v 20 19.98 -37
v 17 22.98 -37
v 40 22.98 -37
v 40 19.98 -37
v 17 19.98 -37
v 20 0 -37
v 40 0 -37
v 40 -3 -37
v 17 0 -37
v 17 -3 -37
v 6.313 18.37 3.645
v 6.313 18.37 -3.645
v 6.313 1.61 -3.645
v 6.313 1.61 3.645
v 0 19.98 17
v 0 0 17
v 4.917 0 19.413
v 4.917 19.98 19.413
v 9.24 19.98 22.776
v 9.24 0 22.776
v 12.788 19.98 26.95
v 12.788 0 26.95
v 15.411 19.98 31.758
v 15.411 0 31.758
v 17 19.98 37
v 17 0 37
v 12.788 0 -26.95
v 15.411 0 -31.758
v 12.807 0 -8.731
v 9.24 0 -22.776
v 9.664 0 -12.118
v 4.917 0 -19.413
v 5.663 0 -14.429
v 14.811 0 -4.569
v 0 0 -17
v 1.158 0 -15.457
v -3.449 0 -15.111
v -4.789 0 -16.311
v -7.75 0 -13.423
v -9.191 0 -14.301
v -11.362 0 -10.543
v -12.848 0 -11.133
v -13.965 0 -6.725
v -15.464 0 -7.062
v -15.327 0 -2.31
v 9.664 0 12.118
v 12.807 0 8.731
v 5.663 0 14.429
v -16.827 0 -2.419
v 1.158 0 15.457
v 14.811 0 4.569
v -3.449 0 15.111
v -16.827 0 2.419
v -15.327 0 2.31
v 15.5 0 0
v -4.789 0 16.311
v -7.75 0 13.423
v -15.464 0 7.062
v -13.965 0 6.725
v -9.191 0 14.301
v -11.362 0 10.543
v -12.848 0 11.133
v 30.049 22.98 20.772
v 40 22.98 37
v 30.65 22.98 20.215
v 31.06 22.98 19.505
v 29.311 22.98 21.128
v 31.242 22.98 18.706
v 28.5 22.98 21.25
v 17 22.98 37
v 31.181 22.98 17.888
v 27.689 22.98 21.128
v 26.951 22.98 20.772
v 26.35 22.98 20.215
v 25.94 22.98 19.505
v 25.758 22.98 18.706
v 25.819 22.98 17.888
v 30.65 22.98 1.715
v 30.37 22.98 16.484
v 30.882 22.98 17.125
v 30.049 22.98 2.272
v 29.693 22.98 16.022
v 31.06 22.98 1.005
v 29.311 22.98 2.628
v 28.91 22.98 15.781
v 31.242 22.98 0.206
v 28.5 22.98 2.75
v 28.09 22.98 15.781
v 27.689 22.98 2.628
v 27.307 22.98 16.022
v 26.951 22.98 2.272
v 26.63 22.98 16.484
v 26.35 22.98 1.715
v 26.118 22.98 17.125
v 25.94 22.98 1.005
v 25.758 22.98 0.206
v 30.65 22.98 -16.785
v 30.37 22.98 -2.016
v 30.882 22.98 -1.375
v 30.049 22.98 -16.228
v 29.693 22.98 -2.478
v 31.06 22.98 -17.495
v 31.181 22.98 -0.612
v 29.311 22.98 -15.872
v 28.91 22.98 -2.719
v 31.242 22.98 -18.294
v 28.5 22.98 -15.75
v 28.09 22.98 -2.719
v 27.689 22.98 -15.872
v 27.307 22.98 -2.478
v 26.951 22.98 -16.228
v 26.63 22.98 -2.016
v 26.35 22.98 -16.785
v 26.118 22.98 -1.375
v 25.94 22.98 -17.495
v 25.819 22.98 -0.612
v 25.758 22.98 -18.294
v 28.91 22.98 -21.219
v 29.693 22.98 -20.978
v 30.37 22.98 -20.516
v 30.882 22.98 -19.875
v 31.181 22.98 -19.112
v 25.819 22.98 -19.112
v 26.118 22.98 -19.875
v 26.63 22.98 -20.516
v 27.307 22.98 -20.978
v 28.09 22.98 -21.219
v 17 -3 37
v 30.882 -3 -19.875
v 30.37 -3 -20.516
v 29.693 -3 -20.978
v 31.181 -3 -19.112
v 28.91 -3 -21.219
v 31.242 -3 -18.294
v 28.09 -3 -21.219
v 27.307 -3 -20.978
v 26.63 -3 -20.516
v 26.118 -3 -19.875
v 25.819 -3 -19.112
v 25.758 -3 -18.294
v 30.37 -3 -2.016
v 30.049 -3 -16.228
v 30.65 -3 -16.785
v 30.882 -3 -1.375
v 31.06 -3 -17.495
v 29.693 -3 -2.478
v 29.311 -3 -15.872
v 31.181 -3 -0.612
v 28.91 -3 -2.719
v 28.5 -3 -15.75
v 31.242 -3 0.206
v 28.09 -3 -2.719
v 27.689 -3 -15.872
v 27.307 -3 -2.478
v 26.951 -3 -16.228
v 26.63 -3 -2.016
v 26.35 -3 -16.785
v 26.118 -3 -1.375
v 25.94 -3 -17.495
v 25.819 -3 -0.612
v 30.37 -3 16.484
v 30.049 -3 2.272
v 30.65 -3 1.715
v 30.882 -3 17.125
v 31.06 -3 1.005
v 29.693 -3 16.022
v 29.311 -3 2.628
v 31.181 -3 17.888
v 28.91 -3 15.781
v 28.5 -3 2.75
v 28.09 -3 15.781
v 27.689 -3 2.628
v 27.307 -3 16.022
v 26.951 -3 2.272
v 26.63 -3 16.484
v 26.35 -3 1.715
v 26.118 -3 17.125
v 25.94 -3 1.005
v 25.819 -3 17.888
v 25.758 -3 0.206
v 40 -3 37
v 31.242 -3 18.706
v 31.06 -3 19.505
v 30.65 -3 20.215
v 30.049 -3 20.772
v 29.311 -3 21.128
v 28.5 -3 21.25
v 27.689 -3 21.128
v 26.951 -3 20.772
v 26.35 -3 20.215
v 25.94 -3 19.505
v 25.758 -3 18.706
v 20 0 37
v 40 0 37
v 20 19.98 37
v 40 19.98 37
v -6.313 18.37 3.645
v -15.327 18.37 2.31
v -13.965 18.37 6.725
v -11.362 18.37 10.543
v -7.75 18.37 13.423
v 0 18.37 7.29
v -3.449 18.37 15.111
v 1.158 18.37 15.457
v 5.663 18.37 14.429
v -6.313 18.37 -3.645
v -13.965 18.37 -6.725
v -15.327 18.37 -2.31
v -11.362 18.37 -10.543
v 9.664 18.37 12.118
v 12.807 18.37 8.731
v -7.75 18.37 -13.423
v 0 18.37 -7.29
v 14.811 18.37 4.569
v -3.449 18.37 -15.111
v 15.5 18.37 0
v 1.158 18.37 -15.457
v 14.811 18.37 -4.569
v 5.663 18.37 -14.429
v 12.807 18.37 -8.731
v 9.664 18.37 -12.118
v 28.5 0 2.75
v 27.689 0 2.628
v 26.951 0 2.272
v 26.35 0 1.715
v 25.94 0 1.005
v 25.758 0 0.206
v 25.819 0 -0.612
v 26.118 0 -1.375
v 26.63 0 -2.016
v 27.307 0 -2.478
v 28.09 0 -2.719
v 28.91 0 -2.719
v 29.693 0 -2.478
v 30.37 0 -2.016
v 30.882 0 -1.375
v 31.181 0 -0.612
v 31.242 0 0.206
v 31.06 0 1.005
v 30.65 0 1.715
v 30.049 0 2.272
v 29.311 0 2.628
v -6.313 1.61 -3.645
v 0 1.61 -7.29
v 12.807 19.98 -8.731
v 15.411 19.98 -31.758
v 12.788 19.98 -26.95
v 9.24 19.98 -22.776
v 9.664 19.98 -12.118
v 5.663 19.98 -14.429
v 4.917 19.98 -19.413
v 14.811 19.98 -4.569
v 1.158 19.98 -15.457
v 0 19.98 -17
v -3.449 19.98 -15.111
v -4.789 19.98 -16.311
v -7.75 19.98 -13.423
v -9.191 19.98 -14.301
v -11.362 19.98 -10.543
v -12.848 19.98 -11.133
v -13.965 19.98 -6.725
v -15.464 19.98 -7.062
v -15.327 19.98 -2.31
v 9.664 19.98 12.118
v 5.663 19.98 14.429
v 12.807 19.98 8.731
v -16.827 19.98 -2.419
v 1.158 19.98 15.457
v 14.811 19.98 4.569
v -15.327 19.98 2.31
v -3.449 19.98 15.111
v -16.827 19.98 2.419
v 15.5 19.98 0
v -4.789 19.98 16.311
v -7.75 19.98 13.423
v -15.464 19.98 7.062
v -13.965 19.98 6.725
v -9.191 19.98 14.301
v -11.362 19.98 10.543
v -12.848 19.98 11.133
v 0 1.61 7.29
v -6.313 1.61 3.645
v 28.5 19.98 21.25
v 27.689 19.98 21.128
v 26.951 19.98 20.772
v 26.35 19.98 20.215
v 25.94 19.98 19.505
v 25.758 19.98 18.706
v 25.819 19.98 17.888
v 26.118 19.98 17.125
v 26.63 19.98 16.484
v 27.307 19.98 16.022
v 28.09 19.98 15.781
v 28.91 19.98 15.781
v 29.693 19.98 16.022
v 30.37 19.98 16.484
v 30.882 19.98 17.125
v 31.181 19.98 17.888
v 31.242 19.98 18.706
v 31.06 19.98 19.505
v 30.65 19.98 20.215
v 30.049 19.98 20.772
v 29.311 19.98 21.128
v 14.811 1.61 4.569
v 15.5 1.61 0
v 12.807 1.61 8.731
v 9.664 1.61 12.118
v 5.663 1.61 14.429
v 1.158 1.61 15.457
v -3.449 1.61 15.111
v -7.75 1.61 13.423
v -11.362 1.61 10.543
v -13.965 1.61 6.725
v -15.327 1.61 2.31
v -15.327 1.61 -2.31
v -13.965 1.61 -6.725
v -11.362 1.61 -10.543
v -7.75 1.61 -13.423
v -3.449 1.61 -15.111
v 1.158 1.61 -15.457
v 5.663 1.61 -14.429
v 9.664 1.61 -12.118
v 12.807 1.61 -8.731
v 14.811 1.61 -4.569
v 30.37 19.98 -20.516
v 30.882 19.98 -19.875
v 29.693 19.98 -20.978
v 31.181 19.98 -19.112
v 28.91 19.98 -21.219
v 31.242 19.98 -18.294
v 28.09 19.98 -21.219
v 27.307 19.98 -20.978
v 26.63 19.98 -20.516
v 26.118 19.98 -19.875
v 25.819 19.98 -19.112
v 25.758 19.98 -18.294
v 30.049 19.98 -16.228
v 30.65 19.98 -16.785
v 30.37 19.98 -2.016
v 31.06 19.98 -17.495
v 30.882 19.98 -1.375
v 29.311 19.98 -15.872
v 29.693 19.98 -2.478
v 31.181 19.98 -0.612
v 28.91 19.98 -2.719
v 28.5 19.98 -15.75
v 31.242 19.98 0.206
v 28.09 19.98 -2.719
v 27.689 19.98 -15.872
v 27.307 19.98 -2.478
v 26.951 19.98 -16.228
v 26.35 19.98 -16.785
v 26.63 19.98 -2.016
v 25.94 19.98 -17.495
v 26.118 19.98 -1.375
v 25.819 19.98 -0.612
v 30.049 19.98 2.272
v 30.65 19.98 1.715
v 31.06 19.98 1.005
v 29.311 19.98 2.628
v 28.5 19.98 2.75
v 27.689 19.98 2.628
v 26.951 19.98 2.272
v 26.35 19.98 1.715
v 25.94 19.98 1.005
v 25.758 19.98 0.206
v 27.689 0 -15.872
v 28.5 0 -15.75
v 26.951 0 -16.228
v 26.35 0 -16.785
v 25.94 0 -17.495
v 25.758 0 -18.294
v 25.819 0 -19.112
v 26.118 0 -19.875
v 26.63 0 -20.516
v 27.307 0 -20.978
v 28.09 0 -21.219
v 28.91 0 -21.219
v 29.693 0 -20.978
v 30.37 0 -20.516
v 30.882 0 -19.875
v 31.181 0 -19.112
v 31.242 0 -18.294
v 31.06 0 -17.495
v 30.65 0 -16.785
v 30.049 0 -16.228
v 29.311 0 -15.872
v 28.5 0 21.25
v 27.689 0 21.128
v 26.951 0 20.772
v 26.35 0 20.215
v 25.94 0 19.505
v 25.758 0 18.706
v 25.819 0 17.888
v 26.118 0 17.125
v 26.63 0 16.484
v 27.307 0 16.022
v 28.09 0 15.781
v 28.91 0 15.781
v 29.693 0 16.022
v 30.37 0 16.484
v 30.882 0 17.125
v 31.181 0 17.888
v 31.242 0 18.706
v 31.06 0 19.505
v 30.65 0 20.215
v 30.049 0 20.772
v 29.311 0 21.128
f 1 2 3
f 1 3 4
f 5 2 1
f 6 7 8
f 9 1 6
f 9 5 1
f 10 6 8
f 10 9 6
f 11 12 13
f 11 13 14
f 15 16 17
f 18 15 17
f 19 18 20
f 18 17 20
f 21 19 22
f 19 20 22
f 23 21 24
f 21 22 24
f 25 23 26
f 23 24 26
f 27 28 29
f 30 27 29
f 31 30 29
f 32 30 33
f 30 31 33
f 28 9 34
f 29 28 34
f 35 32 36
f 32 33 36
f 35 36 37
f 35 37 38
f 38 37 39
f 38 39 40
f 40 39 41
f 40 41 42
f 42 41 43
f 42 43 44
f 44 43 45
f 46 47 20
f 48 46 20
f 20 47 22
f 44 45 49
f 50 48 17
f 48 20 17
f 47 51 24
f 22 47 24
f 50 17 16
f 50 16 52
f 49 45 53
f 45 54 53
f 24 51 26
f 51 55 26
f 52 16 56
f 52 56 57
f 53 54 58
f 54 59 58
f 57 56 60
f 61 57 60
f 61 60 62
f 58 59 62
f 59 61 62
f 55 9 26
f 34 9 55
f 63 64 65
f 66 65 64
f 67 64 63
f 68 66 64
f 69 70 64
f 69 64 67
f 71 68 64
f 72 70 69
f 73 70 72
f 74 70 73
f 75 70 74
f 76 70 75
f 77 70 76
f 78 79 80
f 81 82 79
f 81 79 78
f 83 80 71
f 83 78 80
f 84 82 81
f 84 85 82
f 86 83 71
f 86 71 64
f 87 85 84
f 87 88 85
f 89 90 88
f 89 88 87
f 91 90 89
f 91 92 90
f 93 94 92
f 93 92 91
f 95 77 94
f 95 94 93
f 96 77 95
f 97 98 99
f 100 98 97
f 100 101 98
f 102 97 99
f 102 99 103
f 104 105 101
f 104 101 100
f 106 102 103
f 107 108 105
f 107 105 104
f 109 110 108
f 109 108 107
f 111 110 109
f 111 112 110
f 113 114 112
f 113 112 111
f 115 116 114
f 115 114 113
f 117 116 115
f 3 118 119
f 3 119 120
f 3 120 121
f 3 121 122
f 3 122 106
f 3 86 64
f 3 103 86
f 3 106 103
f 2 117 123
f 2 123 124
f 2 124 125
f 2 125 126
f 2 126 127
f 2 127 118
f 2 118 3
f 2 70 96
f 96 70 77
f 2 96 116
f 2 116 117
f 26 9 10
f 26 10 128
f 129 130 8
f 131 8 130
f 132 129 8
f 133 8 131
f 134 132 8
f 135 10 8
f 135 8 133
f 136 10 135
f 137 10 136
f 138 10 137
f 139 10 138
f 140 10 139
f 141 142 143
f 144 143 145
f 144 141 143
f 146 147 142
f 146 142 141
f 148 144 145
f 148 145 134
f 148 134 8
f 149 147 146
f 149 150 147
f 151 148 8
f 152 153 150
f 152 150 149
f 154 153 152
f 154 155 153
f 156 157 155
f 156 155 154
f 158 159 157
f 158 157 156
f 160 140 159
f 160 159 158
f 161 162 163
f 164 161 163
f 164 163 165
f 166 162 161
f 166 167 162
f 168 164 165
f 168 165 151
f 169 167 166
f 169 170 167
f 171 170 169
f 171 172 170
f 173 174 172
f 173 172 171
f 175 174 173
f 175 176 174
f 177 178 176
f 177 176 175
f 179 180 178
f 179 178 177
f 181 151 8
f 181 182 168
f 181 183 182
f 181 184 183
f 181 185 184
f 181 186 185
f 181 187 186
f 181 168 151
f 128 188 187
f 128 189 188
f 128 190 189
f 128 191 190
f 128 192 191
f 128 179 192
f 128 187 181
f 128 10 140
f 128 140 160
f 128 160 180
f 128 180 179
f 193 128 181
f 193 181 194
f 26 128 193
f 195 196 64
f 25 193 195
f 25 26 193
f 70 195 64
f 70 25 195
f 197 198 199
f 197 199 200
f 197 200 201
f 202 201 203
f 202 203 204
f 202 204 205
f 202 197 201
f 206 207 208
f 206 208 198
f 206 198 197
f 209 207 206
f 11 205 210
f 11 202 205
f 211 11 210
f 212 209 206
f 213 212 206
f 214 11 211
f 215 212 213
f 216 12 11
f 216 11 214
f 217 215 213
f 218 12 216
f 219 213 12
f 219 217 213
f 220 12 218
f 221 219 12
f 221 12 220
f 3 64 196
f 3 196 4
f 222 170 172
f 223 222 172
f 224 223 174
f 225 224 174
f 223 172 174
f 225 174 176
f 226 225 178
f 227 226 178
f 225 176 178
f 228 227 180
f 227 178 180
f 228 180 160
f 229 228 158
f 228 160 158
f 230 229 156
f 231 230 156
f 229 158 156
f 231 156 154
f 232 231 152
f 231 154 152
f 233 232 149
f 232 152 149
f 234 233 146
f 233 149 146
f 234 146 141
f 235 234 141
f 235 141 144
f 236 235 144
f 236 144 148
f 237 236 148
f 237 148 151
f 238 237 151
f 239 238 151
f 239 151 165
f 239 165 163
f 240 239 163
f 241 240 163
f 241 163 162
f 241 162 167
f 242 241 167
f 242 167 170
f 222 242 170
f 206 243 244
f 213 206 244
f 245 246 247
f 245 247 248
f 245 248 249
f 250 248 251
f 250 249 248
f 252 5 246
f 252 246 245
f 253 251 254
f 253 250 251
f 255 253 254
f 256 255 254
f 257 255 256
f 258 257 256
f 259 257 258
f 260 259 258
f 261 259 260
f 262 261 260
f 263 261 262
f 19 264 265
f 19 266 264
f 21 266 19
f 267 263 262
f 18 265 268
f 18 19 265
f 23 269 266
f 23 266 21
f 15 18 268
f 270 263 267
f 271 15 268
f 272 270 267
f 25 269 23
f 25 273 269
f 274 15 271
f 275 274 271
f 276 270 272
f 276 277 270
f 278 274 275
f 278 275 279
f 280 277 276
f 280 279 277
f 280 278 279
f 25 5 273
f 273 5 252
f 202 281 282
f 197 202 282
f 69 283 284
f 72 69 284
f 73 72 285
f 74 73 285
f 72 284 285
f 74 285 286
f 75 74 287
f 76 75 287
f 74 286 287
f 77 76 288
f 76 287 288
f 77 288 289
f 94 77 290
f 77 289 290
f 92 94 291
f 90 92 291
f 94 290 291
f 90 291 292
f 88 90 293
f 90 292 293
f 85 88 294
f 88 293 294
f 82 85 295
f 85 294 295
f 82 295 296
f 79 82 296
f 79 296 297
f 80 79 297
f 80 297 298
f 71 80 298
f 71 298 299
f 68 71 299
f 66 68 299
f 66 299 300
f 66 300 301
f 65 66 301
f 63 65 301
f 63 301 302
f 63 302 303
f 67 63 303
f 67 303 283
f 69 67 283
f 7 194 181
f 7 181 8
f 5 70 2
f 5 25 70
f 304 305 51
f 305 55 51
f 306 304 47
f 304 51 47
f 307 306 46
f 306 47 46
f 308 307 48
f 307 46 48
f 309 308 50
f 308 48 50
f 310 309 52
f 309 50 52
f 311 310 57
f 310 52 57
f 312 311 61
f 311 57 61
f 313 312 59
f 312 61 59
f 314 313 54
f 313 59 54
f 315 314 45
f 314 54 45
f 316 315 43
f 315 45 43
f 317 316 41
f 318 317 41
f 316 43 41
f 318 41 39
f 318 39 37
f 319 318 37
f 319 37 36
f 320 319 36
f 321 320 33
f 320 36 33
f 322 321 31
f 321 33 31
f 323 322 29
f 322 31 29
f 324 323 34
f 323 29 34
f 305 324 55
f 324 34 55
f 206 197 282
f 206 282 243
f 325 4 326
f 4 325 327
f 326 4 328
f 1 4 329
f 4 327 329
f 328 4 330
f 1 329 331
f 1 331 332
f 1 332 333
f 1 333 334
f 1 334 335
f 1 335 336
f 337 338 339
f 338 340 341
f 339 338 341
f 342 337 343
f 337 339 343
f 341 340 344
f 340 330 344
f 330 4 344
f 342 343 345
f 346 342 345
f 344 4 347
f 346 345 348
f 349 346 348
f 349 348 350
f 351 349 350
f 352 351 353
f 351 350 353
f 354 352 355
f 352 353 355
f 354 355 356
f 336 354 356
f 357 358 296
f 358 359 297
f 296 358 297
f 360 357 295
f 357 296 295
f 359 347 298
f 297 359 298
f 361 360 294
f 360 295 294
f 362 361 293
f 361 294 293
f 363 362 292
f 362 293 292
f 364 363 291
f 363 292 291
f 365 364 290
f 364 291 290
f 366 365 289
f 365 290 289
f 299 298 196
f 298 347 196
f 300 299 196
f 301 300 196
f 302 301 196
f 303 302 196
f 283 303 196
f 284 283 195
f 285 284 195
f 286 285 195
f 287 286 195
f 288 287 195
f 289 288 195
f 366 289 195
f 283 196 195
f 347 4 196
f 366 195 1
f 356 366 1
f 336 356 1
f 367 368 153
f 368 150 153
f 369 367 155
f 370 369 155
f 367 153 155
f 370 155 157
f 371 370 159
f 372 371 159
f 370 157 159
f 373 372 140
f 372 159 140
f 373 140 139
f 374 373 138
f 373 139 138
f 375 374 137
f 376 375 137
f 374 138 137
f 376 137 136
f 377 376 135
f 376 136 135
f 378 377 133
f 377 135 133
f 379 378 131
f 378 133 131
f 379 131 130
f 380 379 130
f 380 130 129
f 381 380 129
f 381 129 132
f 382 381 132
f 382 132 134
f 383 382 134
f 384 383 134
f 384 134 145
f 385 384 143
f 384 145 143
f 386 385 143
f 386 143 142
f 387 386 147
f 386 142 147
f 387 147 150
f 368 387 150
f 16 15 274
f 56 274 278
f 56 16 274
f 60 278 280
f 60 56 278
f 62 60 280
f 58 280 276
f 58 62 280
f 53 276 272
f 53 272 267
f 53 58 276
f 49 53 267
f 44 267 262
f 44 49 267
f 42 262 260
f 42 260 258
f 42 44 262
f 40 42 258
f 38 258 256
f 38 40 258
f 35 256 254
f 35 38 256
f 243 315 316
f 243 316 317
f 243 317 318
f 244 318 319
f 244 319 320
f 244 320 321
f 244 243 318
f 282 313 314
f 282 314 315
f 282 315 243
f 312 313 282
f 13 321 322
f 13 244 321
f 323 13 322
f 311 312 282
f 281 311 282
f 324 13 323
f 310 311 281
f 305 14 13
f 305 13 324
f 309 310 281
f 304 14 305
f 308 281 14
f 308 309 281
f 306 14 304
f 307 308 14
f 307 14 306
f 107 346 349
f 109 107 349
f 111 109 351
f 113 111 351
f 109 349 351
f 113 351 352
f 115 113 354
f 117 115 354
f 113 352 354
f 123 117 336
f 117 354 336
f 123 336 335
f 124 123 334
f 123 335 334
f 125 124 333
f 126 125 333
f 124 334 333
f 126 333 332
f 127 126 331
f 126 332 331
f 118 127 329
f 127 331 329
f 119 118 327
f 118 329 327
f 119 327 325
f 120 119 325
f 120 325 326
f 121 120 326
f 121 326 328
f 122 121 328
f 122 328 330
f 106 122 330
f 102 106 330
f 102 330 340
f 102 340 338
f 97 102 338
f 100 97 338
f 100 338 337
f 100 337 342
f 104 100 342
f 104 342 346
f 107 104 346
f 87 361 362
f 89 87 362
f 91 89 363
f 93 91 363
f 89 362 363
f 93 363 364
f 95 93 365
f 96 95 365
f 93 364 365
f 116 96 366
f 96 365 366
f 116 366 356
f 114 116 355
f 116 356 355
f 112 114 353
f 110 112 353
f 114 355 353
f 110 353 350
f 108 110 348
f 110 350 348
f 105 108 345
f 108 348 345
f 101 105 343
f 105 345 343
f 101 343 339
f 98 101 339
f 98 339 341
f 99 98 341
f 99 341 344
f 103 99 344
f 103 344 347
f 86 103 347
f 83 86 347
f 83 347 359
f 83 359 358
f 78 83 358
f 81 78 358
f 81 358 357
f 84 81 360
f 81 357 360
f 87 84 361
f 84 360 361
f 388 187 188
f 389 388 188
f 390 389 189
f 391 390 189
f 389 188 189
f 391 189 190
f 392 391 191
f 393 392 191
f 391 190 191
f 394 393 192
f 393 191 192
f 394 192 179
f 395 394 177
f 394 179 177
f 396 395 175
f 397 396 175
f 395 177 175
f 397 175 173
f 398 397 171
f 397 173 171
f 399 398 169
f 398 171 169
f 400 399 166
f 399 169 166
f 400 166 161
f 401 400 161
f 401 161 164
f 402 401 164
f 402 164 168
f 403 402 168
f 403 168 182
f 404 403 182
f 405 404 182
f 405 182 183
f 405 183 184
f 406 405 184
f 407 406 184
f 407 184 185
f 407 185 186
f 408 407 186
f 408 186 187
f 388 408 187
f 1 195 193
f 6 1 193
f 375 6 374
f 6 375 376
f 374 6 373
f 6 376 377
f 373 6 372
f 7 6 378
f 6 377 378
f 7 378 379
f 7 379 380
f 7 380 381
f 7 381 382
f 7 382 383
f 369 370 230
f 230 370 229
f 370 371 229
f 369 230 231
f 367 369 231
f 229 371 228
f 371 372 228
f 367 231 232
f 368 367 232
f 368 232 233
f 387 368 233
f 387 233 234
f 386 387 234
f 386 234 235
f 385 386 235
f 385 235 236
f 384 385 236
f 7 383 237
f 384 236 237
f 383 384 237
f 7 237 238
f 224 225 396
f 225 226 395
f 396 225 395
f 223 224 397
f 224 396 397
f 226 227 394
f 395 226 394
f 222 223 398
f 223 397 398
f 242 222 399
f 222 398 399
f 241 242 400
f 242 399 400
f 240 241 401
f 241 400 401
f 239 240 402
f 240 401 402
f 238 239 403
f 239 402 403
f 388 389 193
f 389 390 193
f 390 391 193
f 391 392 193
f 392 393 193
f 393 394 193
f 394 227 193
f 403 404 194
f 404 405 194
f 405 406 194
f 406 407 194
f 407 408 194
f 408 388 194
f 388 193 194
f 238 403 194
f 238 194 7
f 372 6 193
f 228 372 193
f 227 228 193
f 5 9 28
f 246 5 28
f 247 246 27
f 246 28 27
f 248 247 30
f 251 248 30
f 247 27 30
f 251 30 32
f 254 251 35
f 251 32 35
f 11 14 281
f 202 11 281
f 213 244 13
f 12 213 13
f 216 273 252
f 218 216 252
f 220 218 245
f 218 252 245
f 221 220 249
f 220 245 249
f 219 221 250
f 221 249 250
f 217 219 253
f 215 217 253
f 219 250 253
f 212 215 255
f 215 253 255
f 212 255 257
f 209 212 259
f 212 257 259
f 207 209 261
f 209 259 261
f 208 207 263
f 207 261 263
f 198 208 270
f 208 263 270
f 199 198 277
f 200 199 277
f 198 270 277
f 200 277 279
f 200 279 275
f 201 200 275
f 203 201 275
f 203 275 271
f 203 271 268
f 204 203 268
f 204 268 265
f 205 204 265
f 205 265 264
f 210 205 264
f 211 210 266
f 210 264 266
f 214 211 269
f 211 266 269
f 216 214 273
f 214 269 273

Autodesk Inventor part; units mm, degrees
ref_plane "YZ Plane" through (0, 0, 0) normal (1, 0, 0) x (0, 1, 0)
ref_plane "XZ Plane" through (0, 0, 0) normal (0, 1, 0) x (-1, 0, 0)
ref_plane "XY Plane" through (0, 0, 0) normal (0, 0, 1) x (1, 0, 0)
sketch "Sketch1" plane through (0, 0, 0) normal (0, 1, 0) x (-1, 0, 0)
  circle A0 centre (0, 0) radius 17
  dimension "d6" = 34
extrude "Extrusion1" add sketch "Sketch1" along normal blind 19.98
sketch "Sketch2" plane through (0, 19.98, 0) normal (0, 1, 0) x (1, 0, 0)
  circle A0 centre (0, 0) radius 15.5
  dimension "d9" = 31
extrude "Extrusion2" cut sketch "Sketch2" against normal blind 1.61
sketch "Sketch4" plane through (0, 0, 0) normal (0, -1, 0) x (1, 0, 0)
  circle A0 centre (0, 0) radius 15.5
  dimension "d15" = 31
extrude "Extrusion4" cut sketch "Sketch4" against normal blind 1.61
sketch "Sketch5" plane through (0, 0, 0) normal (0, -1, 0) x (1, 0, 0)
  circle A0 centre (0, 0) radius 17 projected
  line L0 (17, 0) -> (17, 17)
  line L1 (17, 17) -> (17, 37)
  line L2 (17, 0) -> (17, -17)
  line L3 (17, -17) -> (17, -37)
  line L4 (17, 37) -> (37, 37)
  line L5 (37, 37) -> (37, -37)
  line L6 (37, -37) -> (17, -37)
  arc A1 (0, 17) -> (17, 37) centre (-9.2645, 42.0999) ccw
  circle A2 centre (0, 0) radius 14.285 projected
  arc A3 (17, -37) -> (0, -17) centre (-9.2645, -42.0999) ccw
  point P0 (0, -17)
  dimension "d18" = 20
  dimension "d19" = 20
  dimension "d20" = 20
extrude "Extrusion5" add sketch "Sketch5" against normal blind 19.98 contours L2 L3 A3 A0 | A0 A1 L1 L0 | L0 L1 L4 L5 L6 L3 L2
sketch "Sketch7" plane through (0, 19.98, 0) normal (0, 1, 0) x (1, 0, 0)
  arc A0 (0, 17) -> (17, 37) centre (-9.2645, 42.0999) ccw projected
  line L0 (37, -37) -> (37, 37) projected
  line L1 (17, 37) -> (37, 37)
  line L2 (37, 37) -> (37, -37)
  line L3 (37, -37) -> (17, -37)
  line L4 (17, -37) -> (17, 37)
  point P0 (0, 0)
extrude "Extrusion6" add sketch "Sketch7" along normal blind 3
sketch "Sketch9" plane through (0, 0, 0) normal (0, -1, 0) x (1, 0, 0)
  line L0 (17, 37) -> (37, 37) projected
  line L1 (17, -37) -> (17, 37) projected
  line L2 (37, 37) -> (17, 37)
  line L3 (17, 37) -> (17, -37)
  line L4 (17, -37) -> (37, -37)
  line L5 (37, -37) -> (37, 37)
  point P0 (0, 0)
extrude "Extrusion7" add sketch "Sketch9" along normal blind 3
sketch "Sketch11" plane through (37, 22.98, 37) normal (1, 0, 0) x (0, 0, -1)
  line L0 (0, -3) -> (0, 0) projected
  line L1 (74, -22.98) -> (74, -25.98) projected
  line L2 (0, 0) -> (74, 0)
  line L3 (74, 0) -> (74, -25.98)
  line L4 (74, -25.98) -> (0, -25.98)
  line L5 (0, -25.98) -> (0, 0)
  point P0 (37, -22.98)
extrude "Extrusion8" add sketch "Sketch11" along normal blind 3
sketch "Sketch12" plane through (17, 19.98, 37) normal (0, 0, 1) x (1, 0, 0)
  line L0 (23, -22.98) -> (23, 3) projected
  line L1 (23, 0) -> (3, 0)
  line L2 (3, 0) -> (3, -19.98)
  line L3 (3, -19.98) -> (23, -19.98)
  line L4 (23, -19.98) -> (23, 0)
  line L5 (0, 3) -> (23, 3) projected
  line L6 (0, -19.98) -> (0, 0) projected
  line L7 (0, -22.98) -> (23, -22.98) projected
  point P0 (-17, -19.98)
  point P1 (23, -19.98)
  dimension "d29" = 3
  dimension "d30" = 3
  dimension "d31" = 3
extrude "Extrusion9" cut sketch "Sketch12" against normal through all
sketch "Sketch13" plane through (0, 18.37, 0) normal (0, 1, 0) x (1, 0, 0)
  line L0 (0, 7.29) -> (6.3133, 3.645)
  line L1 (6.3133, 3.645) -> (6.3133, -3.645)
  line L2 (6.3133, -3.645) -> (0, -7.29)
  line L3 (0, -7.29) -> (-6.3133, -3.645)
  line L4 (-6.3133, -3.645) -> (-6.3133, 3.645)
  line L5 (-6.3133, 3.645) -> (0, 7.29)
  point P0 (0, 0)
  point P1 (0, 0)
extrude "Extrusion10" cut sketch "Sketch13" against normal through all
sketch "Sketch14" plane through (0, 22.98, 0) normal (0, 1, 0) x (1, 0, 0)
  line L0 (40, 37) -> (40, -37) projected
  line L1 (17, -37) -> (40, -37) projected
  point P0 (0, 0)
  point P1 (28.5, 0)
  dimension "d37" = 11.5
  dimension "d38" = 37
hole "Hole1" at (28.5, 22.98, 0) direction (0, -1, 0) diameter 5.5 end through all clearance for "Flat Head Machine Screw" size "M5" standard "Ansi Metric M Profile"
sketch "Sketch15" plane through (0, 22.98, 0) normal (0, 1, 0) x (1, 0, 0)
  circle A0 centre (28.5, -18.5) radius 3.0917
  circle A1 centre (28.5, 18.5) radius 2.226
  line L0 (17, 37) -> (40, 37) projected
  line L1 (17, -37) -> (40, -37) projected
  point P0 (0, 0)
  point P1 (28.5, 37)
  dimension "d47" = 18.5
  dimension "d48" = 18.5
hole "Hole2" at (28.5, 22.98, 18.5) at (28.5, 22.98, -18.5) direction (0, -1, 0) diameter 5.5 end through all clearance for "Flat Head Machine Screw" size "M5" standard "Ansi Metric M Profile"
properties part number "CH-1-01-BearingBracket"
